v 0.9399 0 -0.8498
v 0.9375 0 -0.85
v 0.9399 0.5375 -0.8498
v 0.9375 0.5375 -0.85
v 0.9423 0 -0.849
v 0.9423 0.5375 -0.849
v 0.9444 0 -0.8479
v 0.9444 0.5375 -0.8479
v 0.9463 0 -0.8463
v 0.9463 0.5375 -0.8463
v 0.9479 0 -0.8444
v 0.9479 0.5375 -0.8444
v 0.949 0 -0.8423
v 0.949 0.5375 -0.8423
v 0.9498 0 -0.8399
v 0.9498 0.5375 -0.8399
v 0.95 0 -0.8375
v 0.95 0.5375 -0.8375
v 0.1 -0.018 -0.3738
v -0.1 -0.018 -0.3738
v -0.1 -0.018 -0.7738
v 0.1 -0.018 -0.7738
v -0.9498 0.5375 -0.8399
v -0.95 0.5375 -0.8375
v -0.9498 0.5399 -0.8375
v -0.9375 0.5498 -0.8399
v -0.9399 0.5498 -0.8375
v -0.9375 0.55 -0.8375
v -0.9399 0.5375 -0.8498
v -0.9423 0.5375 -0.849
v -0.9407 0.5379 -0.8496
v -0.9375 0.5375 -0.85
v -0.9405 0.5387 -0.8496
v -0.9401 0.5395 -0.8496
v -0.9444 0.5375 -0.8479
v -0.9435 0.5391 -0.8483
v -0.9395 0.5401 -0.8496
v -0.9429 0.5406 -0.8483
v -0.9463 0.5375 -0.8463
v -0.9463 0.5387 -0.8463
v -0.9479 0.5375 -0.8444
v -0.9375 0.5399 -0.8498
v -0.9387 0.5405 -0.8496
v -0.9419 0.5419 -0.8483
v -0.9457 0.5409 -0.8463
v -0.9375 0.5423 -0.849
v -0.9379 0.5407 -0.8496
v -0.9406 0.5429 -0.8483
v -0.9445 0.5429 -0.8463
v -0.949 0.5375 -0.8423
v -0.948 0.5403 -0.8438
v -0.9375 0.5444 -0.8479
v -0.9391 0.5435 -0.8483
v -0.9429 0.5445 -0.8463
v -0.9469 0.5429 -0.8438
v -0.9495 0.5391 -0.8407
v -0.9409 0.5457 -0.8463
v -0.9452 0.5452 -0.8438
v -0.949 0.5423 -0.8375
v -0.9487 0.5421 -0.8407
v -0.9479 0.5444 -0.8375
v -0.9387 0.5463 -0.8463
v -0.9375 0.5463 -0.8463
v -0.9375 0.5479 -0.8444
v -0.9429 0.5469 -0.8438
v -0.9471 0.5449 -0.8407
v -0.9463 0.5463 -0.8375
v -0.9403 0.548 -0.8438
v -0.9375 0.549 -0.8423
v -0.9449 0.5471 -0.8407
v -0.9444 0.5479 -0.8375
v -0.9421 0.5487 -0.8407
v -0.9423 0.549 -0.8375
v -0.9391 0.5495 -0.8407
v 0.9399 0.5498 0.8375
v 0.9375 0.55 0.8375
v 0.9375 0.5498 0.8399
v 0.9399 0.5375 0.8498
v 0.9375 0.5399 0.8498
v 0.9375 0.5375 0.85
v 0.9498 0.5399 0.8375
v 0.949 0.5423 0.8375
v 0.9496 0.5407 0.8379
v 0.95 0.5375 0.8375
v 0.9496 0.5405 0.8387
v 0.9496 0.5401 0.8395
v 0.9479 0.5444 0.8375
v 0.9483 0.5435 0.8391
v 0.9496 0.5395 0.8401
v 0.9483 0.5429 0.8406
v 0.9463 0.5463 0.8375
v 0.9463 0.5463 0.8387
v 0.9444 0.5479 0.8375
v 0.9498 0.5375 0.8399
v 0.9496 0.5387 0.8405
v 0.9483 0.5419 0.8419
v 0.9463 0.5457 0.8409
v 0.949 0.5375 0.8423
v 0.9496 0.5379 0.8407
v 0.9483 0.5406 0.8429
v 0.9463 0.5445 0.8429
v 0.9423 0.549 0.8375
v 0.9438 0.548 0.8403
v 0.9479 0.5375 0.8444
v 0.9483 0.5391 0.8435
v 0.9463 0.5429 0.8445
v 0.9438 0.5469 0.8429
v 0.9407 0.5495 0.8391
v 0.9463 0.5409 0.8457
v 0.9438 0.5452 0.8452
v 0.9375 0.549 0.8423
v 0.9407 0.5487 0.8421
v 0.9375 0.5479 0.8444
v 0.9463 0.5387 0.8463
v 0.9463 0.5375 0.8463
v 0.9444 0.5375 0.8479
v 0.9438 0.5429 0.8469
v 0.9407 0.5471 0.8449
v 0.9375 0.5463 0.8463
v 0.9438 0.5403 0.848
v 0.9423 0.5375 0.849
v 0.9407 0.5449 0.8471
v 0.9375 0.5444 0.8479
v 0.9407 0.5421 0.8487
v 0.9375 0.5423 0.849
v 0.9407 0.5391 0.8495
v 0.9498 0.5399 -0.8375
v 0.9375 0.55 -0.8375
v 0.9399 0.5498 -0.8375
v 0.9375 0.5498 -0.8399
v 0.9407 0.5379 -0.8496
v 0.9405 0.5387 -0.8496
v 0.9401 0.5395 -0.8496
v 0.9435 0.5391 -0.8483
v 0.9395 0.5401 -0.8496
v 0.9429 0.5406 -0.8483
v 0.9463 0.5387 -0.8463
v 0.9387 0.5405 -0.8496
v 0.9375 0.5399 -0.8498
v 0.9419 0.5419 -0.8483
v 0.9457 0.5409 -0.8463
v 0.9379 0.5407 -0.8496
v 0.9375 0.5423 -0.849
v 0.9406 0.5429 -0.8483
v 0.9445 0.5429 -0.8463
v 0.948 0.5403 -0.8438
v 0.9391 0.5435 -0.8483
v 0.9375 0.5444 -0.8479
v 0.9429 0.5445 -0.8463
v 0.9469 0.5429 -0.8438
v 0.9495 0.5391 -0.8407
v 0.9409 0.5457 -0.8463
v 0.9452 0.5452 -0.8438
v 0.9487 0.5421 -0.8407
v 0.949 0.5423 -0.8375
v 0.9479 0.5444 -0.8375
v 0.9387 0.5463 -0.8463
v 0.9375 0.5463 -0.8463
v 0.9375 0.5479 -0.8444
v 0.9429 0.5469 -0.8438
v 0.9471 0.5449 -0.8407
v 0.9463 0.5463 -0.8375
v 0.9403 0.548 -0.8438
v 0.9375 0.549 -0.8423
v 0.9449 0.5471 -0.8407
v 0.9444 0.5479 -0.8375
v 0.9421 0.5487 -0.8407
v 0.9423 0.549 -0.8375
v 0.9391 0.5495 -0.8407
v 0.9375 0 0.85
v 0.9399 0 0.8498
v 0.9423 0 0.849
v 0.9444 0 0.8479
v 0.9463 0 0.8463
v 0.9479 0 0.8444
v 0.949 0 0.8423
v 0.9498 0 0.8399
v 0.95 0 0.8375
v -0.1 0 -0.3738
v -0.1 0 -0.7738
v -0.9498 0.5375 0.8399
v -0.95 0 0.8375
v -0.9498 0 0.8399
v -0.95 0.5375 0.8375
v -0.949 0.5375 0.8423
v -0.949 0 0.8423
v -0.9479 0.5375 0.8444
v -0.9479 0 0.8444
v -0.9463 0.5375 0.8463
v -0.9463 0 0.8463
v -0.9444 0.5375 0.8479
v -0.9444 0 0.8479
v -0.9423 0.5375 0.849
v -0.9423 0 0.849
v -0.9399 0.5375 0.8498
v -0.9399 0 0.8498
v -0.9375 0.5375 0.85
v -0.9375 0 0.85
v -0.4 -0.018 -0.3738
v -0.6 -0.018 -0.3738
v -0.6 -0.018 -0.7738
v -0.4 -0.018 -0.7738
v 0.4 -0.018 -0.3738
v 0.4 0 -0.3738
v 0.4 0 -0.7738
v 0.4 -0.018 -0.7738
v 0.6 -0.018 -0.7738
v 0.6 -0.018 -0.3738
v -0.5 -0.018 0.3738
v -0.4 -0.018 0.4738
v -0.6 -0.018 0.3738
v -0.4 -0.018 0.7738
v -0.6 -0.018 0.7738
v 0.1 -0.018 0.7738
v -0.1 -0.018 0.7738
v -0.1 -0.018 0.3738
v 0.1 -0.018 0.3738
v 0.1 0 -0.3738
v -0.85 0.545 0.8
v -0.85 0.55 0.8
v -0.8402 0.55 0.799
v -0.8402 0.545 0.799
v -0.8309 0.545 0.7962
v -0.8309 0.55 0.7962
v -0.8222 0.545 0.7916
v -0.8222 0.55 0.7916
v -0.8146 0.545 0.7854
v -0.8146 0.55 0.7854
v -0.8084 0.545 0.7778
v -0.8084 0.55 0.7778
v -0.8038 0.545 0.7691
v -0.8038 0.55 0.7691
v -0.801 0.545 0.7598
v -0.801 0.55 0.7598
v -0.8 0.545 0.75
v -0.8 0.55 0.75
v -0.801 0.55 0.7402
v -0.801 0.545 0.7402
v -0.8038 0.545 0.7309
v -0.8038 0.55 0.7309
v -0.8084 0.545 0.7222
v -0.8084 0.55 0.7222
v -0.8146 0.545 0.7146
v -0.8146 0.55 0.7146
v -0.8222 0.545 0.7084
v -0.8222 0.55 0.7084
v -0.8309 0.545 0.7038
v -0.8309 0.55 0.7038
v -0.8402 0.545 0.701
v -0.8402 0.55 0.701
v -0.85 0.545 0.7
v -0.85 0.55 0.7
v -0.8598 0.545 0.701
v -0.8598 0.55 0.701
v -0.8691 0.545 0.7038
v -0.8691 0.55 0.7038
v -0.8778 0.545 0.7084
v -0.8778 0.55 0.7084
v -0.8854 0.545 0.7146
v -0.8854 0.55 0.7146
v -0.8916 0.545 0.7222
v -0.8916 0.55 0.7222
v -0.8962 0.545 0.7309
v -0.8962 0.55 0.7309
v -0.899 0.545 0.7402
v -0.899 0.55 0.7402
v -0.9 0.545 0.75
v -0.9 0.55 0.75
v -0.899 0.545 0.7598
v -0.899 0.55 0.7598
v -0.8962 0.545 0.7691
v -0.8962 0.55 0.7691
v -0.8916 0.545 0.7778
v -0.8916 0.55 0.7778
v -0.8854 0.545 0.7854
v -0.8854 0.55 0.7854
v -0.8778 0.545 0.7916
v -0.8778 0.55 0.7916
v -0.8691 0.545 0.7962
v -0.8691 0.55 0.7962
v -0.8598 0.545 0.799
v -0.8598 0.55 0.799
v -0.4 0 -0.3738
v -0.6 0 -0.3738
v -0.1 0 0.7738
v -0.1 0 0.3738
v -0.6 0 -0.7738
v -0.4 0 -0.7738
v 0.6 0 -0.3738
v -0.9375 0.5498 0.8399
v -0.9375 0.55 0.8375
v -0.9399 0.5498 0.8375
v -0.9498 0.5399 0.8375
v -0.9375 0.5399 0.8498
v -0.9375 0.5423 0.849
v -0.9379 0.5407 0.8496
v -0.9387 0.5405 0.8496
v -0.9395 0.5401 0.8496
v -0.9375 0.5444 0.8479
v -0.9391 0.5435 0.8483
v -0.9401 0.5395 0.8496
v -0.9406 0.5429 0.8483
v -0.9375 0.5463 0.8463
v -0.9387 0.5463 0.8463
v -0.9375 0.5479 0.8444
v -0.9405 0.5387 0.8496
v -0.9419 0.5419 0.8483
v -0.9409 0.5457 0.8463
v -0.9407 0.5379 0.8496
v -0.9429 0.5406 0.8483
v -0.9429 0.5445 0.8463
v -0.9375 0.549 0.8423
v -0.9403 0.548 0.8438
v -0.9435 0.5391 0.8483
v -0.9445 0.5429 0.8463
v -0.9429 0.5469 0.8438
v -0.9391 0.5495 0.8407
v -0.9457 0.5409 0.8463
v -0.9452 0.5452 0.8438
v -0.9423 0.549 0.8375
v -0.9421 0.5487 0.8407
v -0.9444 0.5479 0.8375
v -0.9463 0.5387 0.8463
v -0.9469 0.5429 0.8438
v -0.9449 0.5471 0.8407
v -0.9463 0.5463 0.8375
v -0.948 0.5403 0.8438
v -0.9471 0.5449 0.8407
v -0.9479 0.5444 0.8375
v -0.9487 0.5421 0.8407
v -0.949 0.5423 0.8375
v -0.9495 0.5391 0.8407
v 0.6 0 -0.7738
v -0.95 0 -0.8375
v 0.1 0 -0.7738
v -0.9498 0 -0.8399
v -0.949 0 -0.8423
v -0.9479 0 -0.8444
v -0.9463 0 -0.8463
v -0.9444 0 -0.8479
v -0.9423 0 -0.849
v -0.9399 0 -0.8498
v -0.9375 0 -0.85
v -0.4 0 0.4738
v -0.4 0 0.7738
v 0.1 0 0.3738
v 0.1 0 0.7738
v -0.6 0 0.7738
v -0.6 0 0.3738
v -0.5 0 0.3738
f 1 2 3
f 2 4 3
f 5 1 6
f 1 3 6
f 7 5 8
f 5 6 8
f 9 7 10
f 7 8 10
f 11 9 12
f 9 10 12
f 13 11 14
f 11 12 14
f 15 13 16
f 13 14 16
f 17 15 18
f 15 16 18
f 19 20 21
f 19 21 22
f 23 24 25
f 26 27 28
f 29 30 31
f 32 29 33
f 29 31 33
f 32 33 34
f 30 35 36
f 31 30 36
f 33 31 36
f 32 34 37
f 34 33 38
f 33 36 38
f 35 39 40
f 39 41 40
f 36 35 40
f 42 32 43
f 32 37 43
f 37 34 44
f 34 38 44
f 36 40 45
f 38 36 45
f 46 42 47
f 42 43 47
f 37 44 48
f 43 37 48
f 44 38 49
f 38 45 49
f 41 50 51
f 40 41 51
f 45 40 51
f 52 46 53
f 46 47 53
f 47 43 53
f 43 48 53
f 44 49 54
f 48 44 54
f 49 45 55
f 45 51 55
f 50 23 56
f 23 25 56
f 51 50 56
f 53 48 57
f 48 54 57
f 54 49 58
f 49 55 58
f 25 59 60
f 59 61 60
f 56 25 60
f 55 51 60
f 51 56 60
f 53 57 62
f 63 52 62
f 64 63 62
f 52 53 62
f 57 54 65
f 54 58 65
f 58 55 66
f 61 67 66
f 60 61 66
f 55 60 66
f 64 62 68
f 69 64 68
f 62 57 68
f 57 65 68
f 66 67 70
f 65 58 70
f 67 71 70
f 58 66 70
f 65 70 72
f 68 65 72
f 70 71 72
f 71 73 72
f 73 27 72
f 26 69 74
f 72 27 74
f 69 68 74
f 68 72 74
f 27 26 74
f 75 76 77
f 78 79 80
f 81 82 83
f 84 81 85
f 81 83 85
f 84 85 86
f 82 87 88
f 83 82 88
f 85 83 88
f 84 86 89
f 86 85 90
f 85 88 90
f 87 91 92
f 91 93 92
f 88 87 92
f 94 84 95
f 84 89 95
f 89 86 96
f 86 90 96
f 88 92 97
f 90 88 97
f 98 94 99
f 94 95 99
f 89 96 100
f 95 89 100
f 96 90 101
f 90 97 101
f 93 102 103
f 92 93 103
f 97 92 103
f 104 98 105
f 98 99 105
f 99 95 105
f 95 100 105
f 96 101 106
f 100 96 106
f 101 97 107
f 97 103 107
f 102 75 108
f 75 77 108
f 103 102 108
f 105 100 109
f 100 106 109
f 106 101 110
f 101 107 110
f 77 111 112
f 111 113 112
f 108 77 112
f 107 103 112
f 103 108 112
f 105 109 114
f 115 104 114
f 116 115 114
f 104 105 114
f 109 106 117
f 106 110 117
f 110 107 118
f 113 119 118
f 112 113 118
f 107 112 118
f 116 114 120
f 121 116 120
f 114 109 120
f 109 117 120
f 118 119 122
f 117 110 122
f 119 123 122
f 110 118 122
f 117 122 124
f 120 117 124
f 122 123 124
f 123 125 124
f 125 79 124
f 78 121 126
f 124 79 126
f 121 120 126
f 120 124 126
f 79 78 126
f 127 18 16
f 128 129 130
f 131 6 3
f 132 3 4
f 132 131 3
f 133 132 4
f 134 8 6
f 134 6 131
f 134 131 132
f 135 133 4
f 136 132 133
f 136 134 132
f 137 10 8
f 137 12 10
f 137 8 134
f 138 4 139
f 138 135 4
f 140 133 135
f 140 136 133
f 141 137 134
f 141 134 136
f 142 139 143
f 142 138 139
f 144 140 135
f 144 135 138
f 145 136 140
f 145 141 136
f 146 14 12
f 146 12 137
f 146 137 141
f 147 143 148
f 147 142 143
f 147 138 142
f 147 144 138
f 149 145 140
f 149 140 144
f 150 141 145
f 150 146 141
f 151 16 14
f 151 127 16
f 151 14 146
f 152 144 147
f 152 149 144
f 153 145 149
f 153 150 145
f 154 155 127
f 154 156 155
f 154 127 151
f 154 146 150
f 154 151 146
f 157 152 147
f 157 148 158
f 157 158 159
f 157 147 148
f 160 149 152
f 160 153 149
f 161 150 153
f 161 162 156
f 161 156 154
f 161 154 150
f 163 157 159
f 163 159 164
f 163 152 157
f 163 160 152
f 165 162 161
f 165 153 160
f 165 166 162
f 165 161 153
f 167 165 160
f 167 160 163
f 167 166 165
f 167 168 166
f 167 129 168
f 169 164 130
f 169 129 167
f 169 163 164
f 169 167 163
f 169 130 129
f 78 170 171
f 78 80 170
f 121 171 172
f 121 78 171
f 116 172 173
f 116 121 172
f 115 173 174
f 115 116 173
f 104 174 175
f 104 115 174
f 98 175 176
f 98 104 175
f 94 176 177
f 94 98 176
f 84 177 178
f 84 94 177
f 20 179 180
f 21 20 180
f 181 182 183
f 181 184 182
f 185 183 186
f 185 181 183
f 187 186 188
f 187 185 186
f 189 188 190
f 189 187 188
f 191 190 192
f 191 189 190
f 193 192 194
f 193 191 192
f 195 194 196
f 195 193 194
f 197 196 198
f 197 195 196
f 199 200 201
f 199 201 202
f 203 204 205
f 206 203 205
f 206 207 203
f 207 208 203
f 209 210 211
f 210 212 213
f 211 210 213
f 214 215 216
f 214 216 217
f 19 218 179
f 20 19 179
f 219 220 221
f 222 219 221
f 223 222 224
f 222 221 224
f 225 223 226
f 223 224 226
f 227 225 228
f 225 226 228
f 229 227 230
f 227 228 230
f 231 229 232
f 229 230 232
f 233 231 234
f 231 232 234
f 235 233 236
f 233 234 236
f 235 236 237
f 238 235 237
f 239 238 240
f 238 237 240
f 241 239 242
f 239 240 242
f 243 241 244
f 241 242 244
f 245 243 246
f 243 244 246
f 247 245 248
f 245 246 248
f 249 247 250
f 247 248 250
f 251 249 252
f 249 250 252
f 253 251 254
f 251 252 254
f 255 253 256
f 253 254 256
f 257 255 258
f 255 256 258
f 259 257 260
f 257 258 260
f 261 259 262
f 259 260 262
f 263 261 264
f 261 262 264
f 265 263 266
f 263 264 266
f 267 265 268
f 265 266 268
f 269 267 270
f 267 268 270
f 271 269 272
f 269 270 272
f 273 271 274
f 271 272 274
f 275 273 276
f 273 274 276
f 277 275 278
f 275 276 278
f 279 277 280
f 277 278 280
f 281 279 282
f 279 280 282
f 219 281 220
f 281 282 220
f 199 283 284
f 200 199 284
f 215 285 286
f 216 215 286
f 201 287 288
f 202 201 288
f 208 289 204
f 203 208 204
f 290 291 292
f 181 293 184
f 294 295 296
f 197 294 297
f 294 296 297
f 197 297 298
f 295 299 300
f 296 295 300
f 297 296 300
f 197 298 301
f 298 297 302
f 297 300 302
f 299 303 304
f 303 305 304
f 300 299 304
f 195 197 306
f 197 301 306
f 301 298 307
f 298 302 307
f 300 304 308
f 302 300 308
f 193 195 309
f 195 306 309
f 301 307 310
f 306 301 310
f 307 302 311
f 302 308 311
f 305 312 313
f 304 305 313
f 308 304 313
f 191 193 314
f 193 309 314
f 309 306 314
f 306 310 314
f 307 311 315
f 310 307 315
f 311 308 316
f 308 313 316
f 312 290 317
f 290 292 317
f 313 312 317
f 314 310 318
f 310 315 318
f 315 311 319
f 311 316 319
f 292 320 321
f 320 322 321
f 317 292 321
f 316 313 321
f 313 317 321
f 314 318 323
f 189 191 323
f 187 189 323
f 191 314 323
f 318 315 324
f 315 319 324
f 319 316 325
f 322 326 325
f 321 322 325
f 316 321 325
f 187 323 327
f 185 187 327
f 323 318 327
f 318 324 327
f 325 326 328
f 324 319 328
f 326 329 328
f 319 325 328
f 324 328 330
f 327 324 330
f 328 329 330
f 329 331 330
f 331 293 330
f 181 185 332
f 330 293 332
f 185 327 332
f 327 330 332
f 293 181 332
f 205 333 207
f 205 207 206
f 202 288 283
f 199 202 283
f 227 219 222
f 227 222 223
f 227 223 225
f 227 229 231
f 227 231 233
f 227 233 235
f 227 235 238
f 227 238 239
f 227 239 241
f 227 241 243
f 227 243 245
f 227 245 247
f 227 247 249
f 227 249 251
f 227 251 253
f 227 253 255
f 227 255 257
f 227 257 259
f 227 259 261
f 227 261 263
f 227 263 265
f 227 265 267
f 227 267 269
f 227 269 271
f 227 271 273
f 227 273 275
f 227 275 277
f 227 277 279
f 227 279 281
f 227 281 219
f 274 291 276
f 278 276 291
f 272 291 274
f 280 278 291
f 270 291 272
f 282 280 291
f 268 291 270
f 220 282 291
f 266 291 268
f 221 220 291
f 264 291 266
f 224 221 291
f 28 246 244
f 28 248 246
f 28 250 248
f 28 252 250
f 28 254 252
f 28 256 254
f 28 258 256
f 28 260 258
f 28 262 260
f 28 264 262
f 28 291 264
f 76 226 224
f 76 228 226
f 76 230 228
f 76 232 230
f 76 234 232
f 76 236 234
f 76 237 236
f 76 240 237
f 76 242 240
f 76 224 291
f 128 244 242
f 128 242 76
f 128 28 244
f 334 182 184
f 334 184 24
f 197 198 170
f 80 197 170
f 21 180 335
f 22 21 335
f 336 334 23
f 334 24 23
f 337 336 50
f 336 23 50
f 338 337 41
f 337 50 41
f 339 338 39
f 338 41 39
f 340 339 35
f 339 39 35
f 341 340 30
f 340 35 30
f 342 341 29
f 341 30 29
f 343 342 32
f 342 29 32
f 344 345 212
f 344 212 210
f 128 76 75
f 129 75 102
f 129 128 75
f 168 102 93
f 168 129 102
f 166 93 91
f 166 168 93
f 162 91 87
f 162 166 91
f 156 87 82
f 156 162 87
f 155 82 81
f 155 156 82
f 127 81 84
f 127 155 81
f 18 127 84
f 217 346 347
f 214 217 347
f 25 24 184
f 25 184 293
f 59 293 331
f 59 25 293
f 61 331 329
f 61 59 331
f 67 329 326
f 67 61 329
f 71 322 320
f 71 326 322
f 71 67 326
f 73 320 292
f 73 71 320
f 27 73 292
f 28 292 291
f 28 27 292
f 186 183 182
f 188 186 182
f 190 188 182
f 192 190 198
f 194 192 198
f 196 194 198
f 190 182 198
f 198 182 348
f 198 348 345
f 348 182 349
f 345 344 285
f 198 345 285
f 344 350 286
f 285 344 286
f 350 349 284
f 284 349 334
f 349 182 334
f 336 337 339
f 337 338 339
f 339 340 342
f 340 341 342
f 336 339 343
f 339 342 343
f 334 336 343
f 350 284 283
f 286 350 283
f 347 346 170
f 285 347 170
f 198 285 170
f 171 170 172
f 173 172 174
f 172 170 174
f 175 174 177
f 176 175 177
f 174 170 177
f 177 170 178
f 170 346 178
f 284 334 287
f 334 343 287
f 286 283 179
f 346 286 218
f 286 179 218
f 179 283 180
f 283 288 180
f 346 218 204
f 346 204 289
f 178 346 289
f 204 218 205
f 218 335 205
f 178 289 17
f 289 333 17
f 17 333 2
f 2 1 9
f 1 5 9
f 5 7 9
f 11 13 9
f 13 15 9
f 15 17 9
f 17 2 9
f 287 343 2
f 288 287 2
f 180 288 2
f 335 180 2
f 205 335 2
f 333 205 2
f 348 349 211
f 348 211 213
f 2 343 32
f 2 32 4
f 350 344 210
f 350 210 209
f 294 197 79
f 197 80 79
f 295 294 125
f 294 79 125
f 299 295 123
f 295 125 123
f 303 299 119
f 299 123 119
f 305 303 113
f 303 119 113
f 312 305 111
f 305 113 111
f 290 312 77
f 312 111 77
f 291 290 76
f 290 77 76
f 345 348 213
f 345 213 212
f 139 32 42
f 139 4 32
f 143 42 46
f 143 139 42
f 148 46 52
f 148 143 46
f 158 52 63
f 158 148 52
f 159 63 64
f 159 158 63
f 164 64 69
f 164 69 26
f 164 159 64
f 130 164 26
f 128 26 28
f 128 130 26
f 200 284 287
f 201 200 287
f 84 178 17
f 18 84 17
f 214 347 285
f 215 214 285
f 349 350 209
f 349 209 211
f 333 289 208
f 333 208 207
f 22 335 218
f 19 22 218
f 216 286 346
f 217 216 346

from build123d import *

# Parameters (mm, degrees)
SKETCH1_W           = 1.9
SKETCH1_H           = 1.7
BOSS_EXTRUDE1_DEPTH = 0.55
SKETCH2_R           = 0.05
CUT_EXTRUDE1_DEPTH  = 0.005
BOSS_EXTRUDE2_DEPTH = 0.018
FILLET1_R           = 0.0125


with BuildPart() as part:
    # Sketch1 → Boss-Extrude1 (new body)
    with BuildSketch(Plane(origin=(0, 0, 0), x_dir=(1, 0, 0), z_dir=(0, 1, 0))):
        Rectangle(SKETCH1_W, SKETCH1_H)
    extrude(amount=BOSS_EXTRUDE1_DEPTH)

    # Sketch2 → Cut-Extrude1 (cut)
    with BuildSketch(Plane(origin=(0, 0.55, 0), x_dir=(1, 0, 0), z_dir=(0, 1, 0))):
        with Locations(Location((-0.85, -0.75, 0), (0, 0, 270))):
            Circle(SKETCH2_R)
    extrude(amount=-CUT_EXTRUDE1_DEPTH, mode=Mode.SUBTRACT)

    # Sketch3 → Boss-Extrude2 (add)
    with BuildSketch(Plane.XZ):
        Polygon((-0.4, 0.473784773), (-0.5, 0.373784773), (-0.6, 0.373784773), (-0.6, 0.773784773), (-0.4, 0.773784773), align=None)
        Polygon((0, 0.373784773), (0.1, 0.373784773), (0.1, 0.473784773), (0.1, 0.773784773), (-0.1, 0.773784773), (-0.1, 0.373784773), align=None)
        Polygon((-0.5, -0.373784773), (-0.6, -0.373784773), (-0.6, -0.773784773), (-0.4, -0.773784773), (-0.4, -0.473784773), (-0.4, -0.373784773), align=None)
        Polygon((-0.1, -0.373784773), (-0.1, -0.773784773), (0.1, -0.773784773), (0.1, -0.473784773), (0.1, -0.373784773), (0, -0.373784773), align=None)
        Polygon((0.6, -0.773784773), (0.4, -0.773784773), (0.4, -0.473784773), (0.4, -0.373784773), (0.5, -0.373784773), (0.6, -0.373784773), align=None)
    extrude(amount=BOSS_EXTRUDE2_DEPTH)

    # Fillet1
    fillet1_edges = [part.edges().sort_by_distance(p)[0] for p in [
        (-0.95, 0.55, 0),
        (0, 0.55, 0.85),
        (0.95, 0.55, 0),
        (0.95, 0.275, 0.85),
        (-0.95, 0.275, 0.85),
        (-0.95, 0.275, -0.85),
        (0.95, 0.275, -0.85),
        (0, 0.55, -0.85),
    ]]
    fillet(fillet1_edges, radius=FILLET1_R)


solid = part.part
